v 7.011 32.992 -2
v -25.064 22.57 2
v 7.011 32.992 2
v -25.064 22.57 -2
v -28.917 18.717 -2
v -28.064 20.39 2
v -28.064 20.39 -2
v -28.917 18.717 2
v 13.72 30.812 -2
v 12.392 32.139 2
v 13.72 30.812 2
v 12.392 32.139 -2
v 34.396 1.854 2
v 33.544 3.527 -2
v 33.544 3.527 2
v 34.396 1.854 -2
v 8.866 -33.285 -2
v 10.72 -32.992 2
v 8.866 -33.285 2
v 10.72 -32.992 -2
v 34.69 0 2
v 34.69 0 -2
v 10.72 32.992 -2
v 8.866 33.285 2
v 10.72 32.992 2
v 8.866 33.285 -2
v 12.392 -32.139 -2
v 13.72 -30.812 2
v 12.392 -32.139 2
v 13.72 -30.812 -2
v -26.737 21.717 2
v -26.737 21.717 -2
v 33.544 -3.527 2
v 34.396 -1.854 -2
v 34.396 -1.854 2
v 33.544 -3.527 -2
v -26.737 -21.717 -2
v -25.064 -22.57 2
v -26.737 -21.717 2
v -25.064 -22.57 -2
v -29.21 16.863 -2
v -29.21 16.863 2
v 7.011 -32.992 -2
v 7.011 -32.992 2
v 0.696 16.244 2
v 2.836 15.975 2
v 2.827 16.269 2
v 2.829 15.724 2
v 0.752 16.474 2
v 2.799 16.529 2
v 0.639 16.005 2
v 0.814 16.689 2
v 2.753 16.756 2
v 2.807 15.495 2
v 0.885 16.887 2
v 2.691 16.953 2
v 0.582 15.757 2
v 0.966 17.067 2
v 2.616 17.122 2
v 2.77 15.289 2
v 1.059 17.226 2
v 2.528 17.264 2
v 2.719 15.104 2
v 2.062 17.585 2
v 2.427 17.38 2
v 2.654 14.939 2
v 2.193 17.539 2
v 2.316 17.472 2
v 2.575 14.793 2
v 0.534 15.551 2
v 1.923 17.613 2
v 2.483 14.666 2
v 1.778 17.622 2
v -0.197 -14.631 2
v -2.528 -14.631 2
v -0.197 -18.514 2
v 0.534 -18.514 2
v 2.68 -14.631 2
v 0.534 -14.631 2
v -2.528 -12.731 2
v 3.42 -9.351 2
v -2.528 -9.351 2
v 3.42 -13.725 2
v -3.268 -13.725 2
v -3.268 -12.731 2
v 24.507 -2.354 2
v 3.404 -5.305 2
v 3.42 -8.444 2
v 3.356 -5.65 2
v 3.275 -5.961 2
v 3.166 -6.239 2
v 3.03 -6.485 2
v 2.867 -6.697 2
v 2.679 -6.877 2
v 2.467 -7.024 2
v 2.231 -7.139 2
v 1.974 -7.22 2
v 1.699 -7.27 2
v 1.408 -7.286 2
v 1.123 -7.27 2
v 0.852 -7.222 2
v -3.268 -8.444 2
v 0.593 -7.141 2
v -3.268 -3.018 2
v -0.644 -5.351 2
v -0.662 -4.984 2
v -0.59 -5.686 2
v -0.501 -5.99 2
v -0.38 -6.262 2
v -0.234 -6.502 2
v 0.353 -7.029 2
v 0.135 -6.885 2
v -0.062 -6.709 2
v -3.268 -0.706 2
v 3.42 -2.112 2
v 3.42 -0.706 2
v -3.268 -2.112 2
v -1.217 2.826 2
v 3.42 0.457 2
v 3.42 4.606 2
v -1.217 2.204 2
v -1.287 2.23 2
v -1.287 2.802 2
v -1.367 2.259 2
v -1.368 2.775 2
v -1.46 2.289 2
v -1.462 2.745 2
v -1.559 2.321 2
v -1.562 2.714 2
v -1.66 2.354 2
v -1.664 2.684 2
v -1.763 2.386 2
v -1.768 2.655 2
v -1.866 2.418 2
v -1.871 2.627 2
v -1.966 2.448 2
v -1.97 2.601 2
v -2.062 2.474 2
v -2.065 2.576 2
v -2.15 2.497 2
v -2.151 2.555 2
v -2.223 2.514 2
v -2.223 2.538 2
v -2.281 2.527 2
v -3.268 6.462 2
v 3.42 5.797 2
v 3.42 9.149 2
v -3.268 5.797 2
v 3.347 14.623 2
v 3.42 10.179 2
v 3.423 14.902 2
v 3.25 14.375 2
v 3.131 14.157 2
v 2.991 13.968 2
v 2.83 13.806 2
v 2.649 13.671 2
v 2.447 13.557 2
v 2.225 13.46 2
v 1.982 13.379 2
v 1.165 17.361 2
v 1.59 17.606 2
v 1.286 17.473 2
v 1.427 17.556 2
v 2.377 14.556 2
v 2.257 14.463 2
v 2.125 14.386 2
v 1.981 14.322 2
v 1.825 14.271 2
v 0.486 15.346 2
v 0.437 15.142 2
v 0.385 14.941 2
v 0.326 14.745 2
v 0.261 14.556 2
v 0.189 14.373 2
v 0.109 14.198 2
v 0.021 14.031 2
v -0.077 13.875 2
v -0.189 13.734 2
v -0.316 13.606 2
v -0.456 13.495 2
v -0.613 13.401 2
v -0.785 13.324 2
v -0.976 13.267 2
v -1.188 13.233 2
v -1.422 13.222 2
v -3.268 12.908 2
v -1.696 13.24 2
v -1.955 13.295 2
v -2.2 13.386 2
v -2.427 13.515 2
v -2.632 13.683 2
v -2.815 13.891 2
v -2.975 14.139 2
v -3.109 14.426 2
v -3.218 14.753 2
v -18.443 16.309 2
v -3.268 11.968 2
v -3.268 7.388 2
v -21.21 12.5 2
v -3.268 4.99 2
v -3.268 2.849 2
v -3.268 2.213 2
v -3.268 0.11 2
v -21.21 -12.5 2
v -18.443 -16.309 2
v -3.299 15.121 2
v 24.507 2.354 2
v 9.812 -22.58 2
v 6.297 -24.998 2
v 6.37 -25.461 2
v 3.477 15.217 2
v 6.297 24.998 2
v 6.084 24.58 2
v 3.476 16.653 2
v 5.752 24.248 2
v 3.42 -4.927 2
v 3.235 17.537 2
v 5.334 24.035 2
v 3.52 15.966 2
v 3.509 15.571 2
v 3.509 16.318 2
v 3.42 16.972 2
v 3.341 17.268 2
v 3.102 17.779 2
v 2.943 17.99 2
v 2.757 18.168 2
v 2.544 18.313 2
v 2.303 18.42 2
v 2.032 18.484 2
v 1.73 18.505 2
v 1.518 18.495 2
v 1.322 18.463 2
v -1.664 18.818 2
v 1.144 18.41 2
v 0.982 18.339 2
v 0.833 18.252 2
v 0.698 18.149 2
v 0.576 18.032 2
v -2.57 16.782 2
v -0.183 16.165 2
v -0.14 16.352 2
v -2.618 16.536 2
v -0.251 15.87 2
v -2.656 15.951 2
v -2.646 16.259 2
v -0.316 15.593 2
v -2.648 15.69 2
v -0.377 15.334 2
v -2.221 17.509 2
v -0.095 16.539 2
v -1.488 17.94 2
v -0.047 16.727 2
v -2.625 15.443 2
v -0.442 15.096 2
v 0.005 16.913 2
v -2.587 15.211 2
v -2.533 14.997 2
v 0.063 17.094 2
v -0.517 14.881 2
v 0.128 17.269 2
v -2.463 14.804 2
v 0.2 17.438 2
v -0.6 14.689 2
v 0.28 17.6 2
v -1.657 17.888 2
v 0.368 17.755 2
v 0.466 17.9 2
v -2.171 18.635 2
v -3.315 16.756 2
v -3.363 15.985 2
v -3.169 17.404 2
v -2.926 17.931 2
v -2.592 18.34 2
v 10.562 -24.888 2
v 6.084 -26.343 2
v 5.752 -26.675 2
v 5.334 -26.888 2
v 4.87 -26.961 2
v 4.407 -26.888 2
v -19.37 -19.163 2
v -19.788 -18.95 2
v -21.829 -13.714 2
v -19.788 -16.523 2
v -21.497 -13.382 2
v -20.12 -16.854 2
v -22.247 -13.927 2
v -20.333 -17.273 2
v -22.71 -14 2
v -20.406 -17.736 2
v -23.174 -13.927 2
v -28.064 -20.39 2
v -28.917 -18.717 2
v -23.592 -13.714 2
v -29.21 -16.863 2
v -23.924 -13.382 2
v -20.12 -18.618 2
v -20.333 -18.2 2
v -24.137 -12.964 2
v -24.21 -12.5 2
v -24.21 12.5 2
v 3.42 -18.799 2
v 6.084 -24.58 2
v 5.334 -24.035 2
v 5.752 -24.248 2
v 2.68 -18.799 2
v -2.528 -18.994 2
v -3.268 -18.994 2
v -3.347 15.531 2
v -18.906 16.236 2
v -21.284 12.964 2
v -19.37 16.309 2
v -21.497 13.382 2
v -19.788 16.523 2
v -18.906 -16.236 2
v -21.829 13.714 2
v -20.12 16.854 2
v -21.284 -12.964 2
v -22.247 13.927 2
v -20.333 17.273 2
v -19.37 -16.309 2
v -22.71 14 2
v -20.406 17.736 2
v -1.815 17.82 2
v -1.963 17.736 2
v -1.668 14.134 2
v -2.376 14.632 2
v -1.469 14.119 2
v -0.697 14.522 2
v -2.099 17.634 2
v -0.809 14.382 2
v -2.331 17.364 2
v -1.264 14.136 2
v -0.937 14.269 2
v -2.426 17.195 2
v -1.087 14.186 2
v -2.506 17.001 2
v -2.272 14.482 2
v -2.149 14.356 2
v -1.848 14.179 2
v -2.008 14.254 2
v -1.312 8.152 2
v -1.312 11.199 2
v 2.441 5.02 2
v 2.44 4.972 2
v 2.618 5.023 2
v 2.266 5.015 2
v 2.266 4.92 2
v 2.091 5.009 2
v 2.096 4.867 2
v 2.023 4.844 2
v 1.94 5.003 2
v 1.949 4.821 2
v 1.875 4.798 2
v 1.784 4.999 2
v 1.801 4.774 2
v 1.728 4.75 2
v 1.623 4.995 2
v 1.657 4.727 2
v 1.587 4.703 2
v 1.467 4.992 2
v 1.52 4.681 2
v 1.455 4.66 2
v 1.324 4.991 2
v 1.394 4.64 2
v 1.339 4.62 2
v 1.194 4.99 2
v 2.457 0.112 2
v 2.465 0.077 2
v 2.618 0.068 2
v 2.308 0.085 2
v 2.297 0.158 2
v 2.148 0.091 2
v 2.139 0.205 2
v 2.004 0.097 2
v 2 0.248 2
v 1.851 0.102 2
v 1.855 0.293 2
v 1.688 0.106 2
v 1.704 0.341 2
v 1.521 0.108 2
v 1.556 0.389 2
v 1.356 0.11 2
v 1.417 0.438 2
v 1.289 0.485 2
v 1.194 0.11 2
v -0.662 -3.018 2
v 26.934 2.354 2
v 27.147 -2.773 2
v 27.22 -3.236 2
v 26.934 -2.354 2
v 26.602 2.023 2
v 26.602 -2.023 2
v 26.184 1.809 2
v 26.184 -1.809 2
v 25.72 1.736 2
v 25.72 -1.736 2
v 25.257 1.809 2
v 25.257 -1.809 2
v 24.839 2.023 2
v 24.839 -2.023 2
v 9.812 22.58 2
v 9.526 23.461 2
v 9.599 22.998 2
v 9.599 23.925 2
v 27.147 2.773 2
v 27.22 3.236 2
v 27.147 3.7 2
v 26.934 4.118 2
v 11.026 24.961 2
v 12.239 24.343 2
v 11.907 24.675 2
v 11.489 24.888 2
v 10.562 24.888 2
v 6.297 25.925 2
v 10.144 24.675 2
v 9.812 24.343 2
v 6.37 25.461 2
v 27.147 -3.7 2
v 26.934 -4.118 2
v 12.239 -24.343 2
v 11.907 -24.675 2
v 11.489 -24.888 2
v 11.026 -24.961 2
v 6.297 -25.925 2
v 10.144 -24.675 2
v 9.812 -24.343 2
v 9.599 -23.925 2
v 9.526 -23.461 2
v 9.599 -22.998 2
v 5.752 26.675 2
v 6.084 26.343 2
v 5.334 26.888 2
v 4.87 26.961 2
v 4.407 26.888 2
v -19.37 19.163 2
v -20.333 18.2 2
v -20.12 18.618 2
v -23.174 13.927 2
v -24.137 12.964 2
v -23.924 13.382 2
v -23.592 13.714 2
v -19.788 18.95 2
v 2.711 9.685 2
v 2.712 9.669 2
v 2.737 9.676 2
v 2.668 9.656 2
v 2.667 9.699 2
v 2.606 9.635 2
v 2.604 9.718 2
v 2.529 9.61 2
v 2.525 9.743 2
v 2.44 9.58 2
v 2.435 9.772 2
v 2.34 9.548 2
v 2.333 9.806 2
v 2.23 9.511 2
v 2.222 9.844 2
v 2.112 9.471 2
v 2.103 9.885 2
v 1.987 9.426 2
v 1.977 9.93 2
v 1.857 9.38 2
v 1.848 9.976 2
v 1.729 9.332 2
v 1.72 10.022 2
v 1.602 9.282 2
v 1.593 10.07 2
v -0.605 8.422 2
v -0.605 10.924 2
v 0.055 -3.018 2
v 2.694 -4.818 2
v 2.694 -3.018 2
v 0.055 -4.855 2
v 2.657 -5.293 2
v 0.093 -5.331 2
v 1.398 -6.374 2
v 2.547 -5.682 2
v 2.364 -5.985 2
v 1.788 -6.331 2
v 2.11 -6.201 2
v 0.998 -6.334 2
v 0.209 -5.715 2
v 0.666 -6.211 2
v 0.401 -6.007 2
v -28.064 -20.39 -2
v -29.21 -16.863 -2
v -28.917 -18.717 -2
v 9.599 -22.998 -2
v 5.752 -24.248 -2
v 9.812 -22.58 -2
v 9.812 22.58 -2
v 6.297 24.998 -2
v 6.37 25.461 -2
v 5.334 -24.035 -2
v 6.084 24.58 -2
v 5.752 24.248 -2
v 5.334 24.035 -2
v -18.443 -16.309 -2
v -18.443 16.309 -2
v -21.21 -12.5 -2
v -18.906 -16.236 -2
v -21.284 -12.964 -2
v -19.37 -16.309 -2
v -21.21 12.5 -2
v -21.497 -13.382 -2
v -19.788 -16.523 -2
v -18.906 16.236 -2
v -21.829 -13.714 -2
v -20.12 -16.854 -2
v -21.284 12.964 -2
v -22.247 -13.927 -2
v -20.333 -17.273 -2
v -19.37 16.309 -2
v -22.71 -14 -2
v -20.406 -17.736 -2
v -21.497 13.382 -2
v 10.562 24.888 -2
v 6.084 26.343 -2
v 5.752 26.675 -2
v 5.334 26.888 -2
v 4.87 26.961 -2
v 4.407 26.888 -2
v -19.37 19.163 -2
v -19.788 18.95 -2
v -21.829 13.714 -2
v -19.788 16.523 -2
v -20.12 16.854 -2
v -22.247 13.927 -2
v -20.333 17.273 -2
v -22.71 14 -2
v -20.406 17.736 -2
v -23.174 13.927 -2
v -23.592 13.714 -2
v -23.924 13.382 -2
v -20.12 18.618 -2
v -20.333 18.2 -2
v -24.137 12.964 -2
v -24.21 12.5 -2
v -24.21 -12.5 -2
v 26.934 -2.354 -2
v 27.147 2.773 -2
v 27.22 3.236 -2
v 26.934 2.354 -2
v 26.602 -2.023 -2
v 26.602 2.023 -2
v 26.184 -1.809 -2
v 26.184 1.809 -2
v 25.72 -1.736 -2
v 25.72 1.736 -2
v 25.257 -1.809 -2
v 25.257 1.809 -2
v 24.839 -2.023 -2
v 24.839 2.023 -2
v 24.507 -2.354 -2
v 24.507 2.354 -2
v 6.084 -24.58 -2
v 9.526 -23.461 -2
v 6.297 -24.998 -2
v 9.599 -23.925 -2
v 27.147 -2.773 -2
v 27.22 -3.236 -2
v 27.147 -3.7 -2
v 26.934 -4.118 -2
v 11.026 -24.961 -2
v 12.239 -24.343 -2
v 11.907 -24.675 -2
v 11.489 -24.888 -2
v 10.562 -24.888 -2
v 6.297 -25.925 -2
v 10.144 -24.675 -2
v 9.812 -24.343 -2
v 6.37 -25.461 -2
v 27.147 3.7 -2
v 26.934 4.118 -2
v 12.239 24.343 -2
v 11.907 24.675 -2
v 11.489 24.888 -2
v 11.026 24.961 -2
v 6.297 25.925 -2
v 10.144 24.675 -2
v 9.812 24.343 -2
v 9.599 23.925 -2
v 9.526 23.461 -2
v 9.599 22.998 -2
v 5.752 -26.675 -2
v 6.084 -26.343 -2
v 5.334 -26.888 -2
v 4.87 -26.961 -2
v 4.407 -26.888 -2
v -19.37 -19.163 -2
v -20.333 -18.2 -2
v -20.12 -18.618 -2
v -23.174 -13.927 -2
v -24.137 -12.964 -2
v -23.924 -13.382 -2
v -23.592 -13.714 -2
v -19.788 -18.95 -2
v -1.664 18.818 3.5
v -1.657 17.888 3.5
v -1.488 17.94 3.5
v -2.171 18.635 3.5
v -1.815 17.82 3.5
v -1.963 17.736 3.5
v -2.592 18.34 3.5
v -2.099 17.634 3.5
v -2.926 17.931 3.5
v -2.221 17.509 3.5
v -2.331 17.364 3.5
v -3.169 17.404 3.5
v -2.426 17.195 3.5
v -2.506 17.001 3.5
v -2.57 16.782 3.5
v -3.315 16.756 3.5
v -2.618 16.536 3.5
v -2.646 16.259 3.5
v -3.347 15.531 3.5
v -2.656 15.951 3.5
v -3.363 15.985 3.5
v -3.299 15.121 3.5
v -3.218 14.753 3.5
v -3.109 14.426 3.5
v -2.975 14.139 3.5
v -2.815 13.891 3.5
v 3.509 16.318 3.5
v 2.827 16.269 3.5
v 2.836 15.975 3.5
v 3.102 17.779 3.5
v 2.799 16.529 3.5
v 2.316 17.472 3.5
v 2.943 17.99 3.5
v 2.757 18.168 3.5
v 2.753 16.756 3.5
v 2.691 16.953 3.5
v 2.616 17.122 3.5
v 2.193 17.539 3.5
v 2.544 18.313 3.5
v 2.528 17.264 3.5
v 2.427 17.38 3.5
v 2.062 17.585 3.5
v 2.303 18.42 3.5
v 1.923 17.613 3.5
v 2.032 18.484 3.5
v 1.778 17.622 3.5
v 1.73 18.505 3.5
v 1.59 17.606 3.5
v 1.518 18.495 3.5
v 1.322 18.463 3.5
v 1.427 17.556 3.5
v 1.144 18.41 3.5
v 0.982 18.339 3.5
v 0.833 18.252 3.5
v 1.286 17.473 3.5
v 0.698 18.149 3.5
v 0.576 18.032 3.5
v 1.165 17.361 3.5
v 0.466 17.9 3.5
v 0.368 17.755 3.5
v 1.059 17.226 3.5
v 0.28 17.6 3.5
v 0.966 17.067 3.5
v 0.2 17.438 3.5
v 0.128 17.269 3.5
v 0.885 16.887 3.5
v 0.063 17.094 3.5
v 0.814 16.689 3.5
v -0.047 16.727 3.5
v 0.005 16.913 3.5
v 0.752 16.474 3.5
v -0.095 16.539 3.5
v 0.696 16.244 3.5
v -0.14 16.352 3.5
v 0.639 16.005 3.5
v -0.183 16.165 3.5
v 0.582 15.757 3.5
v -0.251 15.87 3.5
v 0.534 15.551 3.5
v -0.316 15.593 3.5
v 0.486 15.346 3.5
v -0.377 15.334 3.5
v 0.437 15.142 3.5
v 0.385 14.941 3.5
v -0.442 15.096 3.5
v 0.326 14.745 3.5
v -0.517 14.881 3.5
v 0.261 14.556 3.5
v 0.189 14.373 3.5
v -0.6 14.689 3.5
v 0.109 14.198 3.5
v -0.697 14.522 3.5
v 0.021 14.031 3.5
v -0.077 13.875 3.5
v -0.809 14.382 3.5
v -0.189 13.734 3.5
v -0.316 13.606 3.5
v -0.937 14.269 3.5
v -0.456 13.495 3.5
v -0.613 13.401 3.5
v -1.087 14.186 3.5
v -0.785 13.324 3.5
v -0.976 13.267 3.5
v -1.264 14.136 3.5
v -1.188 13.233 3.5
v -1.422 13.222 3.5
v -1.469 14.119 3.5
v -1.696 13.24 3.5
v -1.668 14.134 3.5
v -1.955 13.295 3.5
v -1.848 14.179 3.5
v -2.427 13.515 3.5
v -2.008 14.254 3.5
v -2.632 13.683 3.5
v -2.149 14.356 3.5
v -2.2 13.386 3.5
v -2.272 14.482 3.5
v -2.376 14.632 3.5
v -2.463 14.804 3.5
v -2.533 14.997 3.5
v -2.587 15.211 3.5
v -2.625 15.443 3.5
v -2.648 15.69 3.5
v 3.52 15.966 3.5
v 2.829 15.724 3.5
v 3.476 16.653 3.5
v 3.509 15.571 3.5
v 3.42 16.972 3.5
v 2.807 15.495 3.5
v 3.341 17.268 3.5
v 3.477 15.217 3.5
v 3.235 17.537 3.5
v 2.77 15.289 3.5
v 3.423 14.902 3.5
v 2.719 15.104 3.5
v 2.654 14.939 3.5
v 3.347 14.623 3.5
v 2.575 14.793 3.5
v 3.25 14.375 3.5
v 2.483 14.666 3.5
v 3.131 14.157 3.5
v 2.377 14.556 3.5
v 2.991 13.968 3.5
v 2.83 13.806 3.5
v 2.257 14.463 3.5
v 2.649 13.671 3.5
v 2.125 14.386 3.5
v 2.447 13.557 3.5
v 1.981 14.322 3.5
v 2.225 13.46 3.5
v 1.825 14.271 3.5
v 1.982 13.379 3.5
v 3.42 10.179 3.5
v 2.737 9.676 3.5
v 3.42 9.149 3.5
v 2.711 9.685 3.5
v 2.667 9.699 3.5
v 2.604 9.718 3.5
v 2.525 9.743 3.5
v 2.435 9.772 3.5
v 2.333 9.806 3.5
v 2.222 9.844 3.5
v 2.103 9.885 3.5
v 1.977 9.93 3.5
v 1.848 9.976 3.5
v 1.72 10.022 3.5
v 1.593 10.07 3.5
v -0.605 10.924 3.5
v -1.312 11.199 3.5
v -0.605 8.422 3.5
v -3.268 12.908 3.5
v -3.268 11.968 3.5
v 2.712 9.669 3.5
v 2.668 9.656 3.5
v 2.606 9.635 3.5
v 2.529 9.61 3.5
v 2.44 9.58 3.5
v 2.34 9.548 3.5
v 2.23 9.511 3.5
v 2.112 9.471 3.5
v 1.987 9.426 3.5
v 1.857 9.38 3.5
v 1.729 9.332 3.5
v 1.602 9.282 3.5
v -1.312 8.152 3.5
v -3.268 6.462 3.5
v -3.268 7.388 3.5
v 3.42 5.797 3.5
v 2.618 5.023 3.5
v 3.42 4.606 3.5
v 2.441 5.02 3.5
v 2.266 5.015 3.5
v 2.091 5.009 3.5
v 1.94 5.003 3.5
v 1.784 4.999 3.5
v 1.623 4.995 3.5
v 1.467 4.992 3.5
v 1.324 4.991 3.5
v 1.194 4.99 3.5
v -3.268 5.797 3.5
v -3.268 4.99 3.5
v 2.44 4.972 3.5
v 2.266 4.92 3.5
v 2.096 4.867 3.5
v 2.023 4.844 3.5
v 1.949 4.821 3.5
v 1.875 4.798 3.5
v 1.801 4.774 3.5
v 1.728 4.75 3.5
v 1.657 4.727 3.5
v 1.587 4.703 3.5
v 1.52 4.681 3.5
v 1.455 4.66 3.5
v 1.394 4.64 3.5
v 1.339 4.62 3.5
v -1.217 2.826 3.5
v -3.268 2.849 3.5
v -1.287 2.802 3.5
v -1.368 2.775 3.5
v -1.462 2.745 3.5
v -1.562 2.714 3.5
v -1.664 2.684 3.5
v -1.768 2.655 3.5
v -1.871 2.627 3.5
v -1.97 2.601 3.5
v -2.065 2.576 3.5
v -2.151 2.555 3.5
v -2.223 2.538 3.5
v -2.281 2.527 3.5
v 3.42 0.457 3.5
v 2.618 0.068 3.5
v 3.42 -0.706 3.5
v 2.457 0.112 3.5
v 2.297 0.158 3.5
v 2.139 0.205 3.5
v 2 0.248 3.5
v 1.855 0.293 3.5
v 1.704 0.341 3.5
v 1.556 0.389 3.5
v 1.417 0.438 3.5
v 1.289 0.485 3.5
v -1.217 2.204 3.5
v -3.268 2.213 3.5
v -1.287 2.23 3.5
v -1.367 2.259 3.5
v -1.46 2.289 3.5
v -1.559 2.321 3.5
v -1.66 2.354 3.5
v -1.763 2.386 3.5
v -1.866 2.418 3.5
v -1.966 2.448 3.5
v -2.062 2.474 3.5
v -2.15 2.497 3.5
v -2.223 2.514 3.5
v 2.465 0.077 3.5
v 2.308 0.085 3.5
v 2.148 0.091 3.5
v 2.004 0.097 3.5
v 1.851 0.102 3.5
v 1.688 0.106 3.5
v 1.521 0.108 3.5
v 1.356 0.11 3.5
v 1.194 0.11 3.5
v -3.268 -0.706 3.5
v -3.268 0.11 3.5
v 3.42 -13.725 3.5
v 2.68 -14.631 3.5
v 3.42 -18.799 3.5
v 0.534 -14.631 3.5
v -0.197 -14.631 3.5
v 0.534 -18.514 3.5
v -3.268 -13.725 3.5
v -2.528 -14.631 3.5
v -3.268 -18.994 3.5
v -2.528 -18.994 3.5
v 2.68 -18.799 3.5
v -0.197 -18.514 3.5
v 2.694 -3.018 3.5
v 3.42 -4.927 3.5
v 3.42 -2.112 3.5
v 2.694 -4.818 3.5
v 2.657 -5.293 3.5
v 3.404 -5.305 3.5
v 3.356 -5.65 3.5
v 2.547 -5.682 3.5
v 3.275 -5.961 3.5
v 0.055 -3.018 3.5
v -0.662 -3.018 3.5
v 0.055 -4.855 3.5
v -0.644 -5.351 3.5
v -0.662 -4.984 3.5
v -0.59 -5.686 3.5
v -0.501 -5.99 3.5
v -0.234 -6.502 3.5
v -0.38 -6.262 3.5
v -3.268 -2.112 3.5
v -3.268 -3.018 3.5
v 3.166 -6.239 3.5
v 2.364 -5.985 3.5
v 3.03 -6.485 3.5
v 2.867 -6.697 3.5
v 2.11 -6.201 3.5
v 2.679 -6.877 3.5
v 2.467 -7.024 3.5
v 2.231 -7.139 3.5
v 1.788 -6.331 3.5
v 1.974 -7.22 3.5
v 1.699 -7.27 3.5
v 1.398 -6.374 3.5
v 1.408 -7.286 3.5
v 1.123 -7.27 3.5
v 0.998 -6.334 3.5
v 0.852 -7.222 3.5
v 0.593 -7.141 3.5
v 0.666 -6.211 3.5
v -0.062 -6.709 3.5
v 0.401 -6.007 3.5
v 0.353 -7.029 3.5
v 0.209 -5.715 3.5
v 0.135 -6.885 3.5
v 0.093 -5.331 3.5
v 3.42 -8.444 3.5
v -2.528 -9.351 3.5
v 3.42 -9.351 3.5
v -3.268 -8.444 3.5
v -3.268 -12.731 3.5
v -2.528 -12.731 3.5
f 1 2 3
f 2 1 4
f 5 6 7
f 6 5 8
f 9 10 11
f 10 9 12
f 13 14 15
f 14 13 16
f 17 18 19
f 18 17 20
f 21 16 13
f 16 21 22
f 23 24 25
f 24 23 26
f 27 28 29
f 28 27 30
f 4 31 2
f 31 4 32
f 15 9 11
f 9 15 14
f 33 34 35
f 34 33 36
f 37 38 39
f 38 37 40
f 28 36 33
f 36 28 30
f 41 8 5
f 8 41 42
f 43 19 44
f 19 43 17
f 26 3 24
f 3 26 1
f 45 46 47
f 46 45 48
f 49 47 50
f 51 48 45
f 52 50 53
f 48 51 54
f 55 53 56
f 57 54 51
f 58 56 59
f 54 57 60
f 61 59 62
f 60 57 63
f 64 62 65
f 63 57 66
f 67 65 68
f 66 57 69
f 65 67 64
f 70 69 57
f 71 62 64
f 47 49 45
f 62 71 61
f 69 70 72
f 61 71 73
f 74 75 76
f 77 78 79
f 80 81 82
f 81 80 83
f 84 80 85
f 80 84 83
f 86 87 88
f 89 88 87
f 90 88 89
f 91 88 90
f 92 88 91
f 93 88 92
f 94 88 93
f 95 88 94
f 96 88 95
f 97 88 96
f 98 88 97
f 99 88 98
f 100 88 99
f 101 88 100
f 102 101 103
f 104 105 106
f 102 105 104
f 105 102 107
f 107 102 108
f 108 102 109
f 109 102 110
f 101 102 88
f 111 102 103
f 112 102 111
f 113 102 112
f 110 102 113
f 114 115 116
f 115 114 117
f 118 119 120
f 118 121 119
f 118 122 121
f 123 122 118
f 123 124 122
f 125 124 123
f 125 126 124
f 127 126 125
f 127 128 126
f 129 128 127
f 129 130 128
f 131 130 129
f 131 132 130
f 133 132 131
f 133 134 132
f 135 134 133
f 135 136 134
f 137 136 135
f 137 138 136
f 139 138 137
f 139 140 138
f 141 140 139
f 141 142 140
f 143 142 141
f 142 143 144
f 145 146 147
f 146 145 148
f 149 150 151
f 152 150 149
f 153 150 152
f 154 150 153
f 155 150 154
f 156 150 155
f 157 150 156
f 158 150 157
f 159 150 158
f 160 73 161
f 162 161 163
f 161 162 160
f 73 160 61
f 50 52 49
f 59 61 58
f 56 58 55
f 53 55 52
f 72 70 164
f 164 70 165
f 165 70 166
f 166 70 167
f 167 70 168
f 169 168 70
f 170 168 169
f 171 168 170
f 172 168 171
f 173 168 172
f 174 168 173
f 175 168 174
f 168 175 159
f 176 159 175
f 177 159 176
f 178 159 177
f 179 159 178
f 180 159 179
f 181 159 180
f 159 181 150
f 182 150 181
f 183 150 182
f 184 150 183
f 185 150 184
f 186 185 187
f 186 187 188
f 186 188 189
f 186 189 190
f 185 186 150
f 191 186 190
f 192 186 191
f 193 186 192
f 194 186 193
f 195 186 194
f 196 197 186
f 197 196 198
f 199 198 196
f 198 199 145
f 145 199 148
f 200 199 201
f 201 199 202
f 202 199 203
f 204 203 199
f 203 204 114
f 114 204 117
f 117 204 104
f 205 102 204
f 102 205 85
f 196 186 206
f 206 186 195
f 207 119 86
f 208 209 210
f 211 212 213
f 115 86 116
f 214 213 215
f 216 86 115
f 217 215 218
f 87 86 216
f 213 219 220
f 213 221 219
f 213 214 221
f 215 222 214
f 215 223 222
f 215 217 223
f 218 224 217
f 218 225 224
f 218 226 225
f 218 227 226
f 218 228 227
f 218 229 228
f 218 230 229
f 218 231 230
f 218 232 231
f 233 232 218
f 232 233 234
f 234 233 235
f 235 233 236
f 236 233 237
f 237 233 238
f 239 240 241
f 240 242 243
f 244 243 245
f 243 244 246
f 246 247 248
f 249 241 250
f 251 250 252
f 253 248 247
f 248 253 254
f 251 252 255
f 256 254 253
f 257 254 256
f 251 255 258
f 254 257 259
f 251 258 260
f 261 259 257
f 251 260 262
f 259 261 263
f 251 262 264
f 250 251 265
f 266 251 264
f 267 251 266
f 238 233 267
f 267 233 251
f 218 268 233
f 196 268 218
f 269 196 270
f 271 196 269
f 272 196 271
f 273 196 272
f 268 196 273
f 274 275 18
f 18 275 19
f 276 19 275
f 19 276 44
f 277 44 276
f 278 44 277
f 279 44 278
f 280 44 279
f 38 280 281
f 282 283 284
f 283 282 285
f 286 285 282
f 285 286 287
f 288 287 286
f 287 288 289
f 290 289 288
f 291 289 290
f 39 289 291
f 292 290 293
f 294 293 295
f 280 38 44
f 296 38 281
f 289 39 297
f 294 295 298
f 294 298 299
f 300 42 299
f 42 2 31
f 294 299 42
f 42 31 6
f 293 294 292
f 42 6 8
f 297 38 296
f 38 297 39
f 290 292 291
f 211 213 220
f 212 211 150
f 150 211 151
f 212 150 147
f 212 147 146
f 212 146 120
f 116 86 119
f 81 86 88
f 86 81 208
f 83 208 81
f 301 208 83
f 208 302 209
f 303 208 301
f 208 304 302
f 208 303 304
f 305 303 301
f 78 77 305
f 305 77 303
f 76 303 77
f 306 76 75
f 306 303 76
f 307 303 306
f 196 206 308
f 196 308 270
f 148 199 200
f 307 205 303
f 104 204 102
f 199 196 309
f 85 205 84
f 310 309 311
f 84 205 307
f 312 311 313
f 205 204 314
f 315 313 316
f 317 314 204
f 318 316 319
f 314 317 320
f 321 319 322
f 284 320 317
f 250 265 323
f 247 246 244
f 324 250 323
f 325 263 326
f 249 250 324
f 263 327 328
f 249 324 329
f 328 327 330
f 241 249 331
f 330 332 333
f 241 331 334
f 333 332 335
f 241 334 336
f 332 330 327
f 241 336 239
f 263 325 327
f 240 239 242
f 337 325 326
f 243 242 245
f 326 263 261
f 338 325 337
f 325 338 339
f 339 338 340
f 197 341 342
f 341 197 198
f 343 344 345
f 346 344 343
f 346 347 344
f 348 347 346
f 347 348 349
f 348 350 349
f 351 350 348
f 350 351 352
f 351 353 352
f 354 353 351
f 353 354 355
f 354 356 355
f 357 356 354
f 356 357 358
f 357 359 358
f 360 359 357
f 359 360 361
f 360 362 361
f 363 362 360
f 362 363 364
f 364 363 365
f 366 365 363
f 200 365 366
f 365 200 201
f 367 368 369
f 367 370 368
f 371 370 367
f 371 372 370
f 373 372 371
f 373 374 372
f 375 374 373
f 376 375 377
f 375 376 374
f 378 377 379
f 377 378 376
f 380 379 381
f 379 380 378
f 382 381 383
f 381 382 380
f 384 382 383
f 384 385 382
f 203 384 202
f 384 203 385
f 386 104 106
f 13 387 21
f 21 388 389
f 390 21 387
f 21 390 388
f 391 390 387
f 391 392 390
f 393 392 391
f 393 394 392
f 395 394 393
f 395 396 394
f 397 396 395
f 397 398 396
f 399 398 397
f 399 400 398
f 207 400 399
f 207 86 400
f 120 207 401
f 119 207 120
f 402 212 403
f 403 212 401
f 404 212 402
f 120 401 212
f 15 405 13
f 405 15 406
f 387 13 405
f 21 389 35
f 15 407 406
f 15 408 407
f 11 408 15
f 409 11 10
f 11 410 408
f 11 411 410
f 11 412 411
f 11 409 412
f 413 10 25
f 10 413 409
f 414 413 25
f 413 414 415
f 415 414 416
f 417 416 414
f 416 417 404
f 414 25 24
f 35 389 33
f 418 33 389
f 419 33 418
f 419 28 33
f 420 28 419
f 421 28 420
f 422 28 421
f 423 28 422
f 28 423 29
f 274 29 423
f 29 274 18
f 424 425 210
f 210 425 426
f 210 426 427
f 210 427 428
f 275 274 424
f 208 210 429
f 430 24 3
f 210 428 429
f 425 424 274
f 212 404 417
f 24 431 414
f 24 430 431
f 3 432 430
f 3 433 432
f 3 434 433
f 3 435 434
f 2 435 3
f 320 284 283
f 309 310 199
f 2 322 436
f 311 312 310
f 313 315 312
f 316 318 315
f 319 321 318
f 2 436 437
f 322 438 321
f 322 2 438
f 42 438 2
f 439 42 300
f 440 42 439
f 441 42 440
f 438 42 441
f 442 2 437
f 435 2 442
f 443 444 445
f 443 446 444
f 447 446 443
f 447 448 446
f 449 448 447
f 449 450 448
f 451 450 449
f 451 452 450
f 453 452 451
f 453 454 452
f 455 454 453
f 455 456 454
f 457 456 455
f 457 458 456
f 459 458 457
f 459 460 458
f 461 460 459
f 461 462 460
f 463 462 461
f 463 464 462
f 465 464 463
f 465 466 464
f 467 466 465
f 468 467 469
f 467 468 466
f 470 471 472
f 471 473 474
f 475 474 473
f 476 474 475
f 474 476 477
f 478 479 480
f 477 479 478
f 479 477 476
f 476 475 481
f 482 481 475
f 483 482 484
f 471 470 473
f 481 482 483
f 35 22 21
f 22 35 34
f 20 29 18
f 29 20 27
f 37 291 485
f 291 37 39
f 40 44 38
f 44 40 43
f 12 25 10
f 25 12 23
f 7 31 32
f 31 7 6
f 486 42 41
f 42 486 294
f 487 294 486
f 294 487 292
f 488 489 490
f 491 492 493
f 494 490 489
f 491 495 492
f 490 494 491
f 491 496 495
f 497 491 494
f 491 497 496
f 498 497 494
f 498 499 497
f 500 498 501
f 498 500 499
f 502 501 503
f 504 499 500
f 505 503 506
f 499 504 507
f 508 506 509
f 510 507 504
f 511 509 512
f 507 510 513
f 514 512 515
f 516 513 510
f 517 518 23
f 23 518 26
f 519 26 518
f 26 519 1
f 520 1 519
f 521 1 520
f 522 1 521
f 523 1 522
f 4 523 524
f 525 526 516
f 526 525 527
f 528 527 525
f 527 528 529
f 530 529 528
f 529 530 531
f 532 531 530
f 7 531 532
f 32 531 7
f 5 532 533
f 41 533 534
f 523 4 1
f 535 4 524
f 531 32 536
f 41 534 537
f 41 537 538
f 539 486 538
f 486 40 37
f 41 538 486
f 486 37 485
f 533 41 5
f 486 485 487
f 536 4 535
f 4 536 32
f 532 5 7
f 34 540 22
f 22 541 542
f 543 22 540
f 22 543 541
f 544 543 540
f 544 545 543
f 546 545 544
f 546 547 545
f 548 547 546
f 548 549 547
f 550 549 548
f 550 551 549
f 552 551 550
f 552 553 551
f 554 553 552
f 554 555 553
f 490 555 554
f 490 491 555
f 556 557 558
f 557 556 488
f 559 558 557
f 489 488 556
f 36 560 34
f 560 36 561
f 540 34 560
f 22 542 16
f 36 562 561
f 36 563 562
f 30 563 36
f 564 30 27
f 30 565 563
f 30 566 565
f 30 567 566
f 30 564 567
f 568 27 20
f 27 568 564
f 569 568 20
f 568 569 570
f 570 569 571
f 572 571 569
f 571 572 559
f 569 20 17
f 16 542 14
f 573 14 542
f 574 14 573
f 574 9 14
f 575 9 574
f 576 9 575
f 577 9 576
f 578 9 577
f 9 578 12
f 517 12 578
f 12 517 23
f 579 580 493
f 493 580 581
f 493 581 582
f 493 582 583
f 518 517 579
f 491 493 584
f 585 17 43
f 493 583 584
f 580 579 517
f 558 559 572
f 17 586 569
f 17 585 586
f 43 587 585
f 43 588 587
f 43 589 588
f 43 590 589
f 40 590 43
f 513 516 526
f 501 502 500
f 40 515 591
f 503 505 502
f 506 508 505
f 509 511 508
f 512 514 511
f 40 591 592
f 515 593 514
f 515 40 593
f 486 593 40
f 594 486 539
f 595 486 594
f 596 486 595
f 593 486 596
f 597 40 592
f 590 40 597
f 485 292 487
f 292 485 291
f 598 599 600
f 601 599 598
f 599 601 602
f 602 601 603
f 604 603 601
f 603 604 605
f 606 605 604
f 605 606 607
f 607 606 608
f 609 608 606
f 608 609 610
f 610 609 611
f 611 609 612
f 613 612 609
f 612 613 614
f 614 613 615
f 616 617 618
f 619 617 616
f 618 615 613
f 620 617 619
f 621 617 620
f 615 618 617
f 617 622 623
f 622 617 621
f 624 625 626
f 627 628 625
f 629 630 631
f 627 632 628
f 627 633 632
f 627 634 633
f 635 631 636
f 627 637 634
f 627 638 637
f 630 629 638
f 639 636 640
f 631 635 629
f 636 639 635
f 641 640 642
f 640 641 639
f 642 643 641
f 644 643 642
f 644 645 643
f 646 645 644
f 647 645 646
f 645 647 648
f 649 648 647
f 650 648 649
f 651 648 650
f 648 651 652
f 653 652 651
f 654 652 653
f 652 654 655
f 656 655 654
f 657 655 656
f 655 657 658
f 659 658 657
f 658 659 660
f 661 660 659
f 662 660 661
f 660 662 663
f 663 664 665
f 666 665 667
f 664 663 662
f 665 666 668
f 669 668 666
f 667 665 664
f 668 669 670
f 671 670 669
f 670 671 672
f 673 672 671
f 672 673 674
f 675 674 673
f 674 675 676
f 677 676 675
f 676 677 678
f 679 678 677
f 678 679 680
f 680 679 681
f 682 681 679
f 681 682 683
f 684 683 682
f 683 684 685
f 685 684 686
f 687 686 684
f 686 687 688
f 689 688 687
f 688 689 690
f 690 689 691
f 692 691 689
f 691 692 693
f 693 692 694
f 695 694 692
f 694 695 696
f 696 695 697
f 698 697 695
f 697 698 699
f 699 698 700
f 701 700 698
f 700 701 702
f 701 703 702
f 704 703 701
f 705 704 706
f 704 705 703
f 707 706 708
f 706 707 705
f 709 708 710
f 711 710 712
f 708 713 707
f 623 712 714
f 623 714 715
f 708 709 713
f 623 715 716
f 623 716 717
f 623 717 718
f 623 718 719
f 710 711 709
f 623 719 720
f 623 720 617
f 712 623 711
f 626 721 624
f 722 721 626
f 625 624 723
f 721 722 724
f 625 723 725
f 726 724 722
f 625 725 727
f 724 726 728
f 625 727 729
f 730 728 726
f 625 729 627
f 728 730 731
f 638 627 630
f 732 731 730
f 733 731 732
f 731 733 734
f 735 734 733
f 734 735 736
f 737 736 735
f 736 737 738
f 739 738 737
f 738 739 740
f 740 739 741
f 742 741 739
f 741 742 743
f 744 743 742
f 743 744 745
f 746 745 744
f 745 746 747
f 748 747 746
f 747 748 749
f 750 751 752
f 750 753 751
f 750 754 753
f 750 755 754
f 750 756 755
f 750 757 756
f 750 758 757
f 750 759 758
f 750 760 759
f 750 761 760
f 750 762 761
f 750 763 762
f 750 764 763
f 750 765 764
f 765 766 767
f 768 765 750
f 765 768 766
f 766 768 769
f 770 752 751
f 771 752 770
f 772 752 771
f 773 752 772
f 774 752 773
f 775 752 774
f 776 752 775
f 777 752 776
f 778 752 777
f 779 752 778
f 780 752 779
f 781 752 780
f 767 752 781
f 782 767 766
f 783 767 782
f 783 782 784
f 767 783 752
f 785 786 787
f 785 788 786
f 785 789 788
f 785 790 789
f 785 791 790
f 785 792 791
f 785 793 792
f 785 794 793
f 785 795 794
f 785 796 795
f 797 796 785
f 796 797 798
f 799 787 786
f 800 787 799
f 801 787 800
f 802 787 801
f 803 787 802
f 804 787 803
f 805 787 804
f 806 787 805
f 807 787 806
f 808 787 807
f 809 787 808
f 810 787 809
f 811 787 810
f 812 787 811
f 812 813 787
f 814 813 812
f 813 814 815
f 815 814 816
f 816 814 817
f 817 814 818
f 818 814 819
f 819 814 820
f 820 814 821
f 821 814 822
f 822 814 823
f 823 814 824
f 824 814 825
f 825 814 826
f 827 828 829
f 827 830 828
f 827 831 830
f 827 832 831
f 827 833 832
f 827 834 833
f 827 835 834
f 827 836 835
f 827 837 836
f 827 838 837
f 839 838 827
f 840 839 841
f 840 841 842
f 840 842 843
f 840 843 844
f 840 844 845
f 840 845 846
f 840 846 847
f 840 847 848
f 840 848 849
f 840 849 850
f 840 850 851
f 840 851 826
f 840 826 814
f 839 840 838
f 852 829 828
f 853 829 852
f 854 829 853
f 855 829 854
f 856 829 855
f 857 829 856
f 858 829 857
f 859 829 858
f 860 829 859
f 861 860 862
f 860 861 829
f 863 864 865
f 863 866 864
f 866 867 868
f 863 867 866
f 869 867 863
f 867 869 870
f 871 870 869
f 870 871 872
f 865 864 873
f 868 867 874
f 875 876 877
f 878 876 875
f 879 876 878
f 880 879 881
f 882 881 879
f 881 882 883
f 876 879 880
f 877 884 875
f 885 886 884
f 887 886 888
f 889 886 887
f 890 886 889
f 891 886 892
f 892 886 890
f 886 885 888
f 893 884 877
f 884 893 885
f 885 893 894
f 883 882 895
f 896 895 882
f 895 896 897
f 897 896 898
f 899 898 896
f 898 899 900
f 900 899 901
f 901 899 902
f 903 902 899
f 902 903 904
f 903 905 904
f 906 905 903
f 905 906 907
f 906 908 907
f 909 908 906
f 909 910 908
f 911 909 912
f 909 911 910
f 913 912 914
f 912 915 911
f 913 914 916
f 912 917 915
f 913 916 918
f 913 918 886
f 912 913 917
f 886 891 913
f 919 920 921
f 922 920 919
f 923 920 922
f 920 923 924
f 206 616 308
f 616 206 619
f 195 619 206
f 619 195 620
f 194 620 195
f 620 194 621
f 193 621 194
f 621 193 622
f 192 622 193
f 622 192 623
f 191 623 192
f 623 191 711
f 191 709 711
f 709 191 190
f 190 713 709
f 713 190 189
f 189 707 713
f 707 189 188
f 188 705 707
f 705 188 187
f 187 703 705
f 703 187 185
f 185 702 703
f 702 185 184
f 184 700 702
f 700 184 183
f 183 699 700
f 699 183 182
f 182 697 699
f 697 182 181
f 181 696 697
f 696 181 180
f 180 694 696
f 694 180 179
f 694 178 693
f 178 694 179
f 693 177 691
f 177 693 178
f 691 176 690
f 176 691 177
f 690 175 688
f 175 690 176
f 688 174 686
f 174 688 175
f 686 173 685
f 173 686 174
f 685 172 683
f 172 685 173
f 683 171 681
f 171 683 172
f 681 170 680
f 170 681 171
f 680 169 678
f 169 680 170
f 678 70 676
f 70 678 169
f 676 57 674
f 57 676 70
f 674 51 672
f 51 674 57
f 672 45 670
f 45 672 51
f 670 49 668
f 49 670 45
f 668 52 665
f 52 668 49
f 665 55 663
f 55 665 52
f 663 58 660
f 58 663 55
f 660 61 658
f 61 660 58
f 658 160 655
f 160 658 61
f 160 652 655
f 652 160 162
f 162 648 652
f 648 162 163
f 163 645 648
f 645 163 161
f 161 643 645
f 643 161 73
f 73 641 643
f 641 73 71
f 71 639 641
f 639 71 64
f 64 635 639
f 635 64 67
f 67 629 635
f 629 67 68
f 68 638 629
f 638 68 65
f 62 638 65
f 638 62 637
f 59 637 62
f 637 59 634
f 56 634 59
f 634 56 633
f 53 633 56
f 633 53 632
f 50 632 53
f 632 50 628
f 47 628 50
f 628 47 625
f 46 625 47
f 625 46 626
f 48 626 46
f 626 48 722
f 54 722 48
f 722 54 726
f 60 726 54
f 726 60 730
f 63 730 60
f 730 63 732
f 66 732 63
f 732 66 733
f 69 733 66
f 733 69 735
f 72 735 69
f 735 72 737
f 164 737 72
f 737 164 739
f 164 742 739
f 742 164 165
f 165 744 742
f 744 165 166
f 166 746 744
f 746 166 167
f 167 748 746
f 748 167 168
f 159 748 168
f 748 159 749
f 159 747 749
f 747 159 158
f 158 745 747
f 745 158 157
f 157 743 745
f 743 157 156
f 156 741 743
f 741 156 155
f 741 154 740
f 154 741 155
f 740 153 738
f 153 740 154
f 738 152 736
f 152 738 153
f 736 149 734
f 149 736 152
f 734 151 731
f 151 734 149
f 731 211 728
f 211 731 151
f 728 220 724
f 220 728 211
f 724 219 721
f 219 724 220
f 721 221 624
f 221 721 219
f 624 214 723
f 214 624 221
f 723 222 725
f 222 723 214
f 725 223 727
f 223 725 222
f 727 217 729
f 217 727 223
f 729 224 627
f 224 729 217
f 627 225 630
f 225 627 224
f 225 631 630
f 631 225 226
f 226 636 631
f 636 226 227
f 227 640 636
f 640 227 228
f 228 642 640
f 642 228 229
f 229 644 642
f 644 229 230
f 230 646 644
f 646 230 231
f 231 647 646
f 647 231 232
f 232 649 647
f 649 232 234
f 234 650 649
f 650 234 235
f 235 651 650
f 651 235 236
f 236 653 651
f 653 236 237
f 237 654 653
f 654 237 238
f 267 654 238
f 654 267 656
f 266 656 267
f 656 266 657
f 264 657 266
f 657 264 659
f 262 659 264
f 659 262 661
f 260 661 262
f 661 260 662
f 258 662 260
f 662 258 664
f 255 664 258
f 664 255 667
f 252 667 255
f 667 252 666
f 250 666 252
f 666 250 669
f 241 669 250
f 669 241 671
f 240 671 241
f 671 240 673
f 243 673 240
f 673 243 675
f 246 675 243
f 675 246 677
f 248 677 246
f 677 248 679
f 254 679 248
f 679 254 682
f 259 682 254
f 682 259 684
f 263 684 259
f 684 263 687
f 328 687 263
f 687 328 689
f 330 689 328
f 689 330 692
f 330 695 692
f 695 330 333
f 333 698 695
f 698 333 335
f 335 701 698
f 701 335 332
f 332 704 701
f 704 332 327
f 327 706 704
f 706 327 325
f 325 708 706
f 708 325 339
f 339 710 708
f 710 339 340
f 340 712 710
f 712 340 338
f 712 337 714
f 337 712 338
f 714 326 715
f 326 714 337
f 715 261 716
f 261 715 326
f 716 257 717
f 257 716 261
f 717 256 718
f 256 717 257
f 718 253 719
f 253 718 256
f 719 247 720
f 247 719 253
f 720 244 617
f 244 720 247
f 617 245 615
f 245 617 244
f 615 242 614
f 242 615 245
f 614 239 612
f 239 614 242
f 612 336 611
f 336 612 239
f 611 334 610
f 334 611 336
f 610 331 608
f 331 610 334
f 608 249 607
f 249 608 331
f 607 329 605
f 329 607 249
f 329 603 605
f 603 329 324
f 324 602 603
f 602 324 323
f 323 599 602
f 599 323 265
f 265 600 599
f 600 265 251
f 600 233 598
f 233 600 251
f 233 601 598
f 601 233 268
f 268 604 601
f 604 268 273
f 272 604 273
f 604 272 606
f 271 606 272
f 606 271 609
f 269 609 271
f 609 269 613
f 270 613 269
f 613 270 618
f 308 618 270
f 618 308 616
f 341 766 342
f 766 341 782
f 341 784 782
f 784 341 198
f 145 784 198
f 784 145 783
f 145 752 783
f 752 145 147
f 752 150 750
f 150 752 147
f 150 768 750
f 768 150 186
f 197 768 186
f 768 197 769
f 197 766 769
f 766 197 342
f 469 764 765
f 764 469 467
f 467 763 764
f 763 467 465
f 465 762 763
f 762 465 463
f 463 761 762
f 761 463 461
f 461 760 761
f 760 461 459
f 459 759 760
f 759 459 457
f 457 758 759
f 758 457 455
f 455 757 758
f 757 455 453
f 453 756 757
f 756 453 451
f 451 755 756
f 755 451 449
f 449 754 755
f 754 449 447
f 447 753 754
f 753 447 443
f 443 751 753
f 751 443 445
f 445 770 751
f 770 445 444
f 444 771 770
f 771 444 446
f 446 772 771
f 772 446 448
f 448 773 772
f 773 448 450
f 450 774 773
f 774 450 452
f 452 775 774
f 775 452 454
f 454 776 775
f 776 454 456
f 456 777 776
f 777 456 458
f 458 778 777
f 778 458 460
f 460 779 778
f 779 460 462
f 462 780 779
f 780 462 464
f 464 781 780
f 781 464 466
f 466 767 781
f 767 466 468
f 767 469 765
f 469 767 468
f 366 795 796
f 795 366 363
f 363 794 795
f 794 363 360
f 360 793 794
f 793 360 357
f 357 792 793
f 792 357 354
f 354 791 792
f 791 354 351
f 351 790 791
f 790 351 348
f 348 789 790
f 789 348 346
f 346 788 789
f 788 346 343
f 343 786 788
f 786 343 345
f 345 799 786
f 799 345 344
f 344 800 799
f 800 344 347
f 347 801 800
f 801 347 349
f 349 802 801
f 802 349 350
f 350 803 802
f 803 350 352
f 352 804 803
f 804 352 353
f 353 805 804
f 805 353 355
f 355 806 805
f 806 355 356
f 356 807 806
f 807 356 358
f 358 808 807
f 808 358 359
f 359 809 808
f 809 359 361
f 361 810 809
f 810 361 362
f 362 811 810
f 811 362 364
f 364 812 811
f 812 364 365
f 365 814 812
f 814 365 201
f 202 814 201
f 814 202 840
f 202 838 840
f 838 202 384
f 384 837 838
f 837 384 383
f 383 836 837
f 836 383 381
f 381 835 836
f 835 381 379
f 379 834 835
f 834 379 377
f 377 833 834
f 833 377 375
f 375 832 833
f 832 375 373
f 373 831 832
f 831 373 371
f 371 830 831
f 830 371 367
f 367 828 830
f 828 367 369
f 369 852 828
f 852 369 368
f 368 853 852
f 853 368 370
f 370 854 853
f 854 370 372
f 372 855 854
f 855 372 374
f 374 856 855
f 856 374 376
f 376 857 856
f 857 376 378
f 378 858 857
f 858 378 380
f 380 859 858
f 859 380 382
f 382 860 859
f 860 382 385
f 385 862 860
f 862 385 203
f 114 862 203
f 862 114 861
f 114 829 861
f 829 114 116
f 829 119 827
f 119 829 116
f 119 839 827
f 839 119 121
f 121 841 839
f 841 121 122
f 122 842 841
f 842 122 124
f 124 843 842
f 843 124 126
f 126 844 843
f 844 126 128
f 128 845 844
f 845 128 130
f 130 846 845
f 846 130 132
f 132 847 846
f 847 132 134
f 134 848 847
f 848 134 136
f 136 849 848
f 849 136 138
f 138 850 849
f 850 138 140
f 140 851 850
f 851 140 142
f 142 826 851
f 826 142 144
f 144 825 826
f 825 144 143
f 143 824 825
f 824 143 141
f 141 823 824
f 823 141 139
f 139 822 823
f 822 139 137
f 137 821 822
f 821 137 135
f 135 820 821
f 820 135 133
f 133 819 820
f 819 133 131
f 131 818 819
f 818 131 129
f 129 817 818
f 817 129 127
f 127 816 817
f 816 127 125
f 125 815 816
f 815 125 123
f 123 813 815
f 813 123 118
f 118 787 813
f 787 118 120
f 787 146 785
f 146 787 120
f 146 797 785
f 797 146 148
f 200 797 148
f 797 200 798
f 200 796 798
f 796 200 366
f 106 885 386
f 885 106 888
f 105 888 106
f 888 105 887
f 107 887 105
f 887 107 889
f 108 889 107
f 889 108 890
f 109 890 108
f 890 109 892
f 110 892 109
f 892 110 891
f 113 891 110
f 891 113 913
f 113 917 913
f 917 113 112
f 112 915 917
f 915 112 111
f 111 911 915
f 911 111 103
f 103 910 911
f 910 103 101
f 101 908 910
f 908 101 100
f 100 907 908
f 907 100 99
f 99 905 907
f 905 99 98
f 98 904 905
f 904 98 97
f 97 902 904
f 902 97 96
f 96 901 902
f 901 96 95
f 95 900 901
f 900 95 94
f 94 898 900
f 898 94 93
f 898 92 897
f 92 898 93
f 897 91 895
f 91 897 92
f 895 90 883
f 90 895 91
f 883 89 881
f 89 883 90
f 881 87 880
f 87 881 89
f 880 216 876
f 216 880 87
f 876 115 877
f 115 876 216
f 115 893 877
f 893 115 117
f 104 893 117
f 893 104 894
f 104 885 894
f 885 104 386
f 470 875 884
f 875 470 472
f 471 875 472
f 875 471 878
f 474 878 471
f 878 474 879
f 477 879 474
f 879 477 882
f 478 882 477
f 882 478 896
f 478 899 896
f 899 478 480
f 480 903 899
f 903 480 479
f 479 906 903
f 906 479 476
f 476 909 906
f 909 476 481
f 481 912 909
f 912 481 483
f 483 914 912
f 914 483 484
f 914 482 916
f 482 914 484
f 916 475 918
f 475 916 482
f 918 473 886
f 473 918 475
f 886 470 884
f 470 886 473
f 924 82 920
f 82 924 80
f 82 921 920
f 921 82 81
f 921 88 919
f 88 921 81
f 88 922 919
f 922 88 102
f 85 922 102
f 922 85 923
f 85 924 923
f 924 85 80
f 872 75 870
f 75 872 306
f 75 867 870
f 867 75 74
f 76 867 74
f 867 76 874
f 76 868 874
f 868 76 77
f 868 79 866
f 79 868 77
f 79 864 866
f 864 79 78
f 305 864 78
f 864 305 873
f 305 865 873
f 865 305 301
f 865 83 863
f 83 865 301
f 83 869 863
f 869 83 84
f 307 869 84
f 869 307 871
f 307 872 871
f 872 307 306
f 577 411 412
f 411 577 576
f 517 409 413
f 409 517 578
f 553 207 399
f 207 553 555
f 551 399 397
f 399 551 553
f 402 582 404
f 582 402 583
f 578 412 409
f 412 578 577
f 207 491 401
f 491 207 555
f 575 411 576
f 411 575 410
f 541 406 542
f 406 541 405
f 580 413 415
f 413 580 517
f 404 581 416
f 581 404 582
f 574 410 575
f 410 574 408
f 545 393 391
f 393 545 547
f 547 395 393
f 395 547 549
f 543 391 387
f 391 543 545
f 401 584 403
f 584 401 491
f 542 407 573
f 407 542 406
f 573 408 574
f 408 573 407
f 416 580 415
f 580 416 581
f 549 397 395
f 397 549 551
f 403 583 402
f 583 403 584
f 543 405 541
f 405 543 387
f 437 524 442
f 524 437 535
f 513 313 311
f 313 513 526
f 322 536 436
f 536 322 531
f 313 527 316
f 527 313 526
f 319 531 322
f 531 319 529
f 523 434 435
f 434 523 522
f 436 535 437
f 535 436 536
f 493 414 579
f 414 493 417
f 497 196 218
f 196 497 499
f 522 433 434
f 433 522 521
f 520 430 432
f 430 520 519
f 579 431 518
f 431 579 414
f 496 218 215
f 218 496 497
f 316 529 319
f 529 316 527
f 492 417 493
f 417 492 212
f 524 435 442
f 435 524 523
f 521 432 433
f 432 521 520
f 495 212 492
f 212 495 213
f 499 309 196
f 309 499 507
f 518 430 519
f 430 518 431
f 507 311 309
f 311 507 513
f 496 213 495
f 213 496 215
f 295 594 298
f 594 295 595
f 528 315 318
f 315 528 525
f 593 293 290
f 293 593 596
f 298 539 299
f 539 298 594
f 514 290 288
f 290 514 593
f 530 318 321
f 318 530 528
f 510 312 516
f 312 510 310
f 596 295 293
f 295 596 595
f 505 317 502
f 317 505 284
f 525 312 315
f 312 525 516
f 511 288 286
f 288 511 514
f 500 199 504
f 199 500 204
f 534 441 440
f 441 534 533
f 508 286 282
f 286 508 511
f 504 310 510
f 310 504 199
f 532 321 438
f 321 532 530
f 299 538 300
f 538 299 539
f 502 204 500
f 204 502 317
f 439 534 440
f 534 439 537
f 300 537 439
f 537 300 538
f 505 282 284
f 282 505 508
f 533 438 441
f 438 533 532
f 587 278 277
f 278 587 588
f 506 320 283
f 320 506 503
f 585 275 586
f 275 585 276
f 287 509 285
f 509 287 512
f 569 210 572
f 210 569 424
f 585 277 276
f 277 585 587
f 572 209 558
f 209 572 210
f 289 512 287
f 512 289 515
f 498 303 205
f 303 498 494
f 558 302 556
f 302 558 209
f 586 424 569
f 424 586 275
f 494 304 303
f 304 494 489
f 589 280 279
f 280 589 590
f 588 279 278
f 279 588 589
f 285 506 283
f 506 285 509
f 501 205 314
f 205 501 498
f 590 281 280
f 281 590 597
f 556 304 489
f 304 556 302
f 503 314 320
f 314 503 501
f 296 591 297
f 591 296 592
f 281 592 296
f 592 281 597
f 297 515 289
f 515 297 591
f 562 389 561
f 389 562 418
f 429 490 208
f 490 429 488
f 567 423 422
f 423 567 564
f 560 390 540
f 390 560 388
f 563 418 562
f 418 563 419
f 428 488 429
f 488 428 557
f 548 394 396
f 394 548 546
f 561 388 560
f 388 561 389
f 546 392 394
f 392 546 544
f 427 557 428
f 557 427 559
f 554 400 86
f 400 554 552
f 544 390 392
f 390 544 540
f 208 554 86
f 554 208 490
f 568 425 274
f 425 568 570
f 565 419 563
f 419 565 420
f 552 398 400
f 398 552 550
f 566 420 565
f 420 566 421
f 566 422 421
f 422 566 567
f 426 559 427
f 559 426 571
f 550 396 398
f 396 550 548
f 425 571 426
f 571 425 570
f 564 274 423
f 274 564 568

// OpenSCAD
/*
*   Configurable Harness Center Ring
*   CudaTox, http://cudatox.ca/l/
*   @cudatox
*
*   Feb 21, 2017
*
*   A procedural strap ring for use in novelty body harnesses with text.
*
*   This software and 3D model(s) are experimental and are provided for educational 
*   purposes only. 
*
*   Use of this software, any of its derivatives, or use of any of the models or 
*   parts provided with or created using this software is done at your own risk. 
*
*   DO NOT use this part for securing loads. DO NOT use this part in applications 
*   that may result in property damage, injury or death. NOT FOR CLIMBING USE.
*   
* 
*   This software and files are licensed under the Creative Commons 
*   Attribution-NonCommercial 3.0 license.
*   
*
*/


belt_width = 25;        //Width of the belt you wish to use
belt_thickness = 3;     //Width of the slots. 
n_sides = 5;            //Number of sides on the ring. This script uses a distance
                        //approximation that only works well if this is greater than three.
thickness = 5;          //Thickness of the plastic on all sides
outside_radius = 6;     //Radius of the filleted corners.
height = 4;             //Extrusion height. this is the actual thickness of the object.

font_size = 7;
font_text = "SAMPLE";
font = "Arial";
text_thickness = 1;     //How far the text sticks out above the surface
text_rotation = -90;

$fn = 20;

module rounded_polygon(n_sides, radius, hypotenuse, height){
    //Actual side length does not include the outside radius.

    hull()
    for( i = [0 : n_sides] ){
        translate([hypotenuse * cos(360 * i/n_sides),  hypotenuse * sin(360 * i/n_sides), 0])
            cylinder(h=height, r = radius, center = true);
    }

}

module belt_slot(belt_width, belt_thickness, height){

        hull(){
            translate([0,-belt_width/2,0])
                cylinder(h=height, r = belt_thickness/2, center = true);
            translate([0,belt_width/2,0])
                cylinder(h=height, r = belt_thickness/2, center = true);
        }

}

module belt_slots(n_sides, distance, thickness, belt_width, belt_thickness, height){
    for (i = [0 : n_sides]){
        rotate([0, 0, i * (360 / n_sides) + 180/n_sides])
            translate([distance,0,0])
                belt_slot(belt_width, belt_thickness, height);
    }
}


//inside side virtual length. This is used to calculate how far the belt slots need to be offset.
side_l = belt_width + belt_thickness + thickness;
//Distance to offset the slots.
distance = side_l/2 / tan(180/n_sides);
echo(side_l);
echo(distance);
edge_distance = distance + belt_thickness / 2 + thickness - outside_radius;
hypot = edge_distance / cos(180/n_sides);

difference(){
    union(){
        rounded_polygon(n_sides, outside_radius, hypot, height);
        rotate([0,0,text_rotation])
        color("orange")
        linear_extrude(text_thickness + thickness/2)
            text(font_text, font_size, font, halign="center", valign="center");
    }
    belt_slots(n_sides, distance, belt_width, belt_width, belt_thickness, height);
}
